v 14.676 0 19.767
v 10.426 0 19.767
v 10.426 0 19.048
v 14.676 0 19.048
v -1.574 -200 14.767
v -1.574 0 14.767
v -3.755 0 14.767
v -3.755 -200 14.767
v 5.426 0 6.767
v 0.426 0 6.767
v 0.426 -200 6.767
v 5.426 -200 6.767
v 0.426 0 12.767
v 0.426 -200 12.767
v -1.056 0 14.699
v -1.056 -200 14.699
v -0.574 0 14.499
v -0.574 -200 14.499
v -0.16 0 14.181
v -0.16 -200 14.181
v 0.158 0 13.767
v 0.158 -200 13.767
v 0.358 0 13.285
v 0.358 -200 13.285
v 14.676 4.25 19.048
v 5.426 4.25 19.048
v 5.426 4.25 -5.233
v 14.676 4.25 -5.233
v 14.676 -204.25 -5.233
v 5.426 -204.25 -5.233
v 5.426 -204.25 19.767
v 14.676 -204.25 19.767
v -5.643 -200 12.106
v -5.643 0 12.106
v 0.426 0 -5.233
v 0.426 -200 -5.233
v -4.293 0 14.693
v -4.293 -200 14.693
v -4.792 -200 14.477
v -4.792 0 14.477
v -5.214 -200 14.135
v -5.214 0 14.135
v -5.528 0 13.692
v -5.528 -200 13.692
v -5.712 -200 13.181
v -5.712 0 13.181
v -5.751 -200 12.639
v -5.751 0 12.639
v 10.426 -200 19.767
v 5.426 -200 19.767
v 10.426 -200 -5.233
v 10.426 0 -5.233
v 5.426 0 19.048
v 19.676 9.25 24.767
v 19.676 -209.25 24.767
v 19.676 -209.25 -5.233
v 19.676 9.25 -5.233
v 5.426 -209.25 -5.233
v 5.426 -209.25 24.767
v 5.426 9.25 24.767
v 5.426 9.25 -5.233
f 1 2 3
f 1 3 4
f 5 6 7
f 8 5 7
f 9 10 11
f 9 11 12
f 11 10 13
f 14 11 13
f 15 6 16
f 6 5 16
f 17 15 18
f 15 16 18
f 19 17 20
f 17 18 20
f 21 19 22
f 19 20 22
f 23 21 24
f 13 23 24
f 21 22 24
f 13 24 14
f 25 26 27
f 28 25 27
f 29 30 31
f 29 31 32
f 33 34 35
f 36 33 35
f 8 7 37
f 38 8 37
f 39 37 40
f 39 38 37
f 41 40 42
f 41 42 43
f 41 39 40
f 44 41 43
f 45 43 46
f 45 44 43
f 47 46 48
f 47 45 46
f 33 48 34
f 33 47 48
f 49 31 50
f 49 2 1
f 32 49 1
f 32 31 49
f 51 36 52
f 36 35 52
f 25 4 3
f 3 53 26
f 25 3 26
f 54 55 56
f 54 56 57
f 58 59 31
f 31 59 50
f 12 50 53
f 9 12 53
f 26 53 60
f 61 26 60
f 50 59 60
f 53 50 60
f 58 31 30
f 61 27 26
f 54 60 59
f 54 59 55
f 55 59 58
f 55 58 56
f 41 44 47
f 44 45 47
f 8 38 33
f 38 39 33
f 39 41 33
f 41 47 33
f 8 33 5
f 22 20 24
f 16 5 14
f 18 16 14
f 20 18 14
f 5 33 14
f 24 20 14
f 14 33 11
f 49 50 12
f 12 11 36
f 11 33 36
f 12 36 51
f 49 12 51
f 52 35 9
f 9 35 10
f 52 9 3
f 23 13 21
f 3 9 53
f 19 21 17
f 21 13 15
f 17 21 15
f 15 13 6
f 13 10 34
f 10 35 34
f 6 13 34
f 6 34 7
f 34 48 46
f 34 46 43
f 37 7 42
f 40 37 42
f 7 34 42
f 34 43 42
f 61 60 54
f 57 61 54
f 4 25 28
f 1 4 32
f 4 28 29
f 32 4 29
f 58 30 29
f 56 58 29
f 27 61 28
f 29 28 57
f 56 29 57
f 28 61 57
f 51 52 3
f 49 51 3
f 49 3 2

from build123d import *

# Parameters (mm, degrees)
F0_W      = 5
F0_H      = 12
F1_DEPTH  = 200
F2_R      = 2
F3_W      = 14.25
F3_H      = 9.25
F4_DEPTH  = 30
F6_DEPTH  = 9.25
F7_W      = 14.25
F7_H      = 9.25
F8_DEPTH  = 30
F9_W      = 9.25
F9_H      = 4.25
F10_DEPTH = 25


with BuildPart() as f1:
    # F0 (on Front) → F1 (new body)
    with BuildSketch(Plane.XZ):
        Polygon((0.426156, 14.766954), (-6.573844, 14.766954), (0.426156, -5.233046), (0.426156, 6.766954), align=None)
        with Locations((2.926156, 0.766954)):
            Rectangle(F0_W, F0_H)
        Polygon((5.426156, 6.766954), (5.426156, -5.233046), (10.426156, -5.233046), (10.426156, 19.766954), (14.676156, 19.766954), (14.676156, -5.233046), (19.676156, -5.233046), (19.676156, 24.766954), (5.426156, 24.766954), align=None)
    extrude(amount=F1_DEPTH)

    # F2
    f2_edges = [f1.edges().sort_by_distance(p)[0] for p in [
        (-6.573844, -100, 14.766954),
        (0.426156, -100, 14.766954),
    ]]
    fillet(f2_edges, radius=F2_R)

    # F3 (on face) → F4 (join)
    with BuildSketch(Plane.XY.offset(24.766954)):
        with Locations((12.551156, 4.625)):
            Rectangle(F3_W, F3_H)
    extrude(amount=-F4_DEPTH)

    # F5 (on face) → F6 (cut)
    with BuildSketch(Plane(origin=(5.426156, 0, 0), x_dir=(0, -1, 0), z_dir=(-1, 0, 0))):
        Polygon((-4.25, -5.233046), (0, -5.233046), (0, 6.766954), (0, 19.047581), (-4.25, 19.047581), align=None)
    extrude(amount=-F6_DEPTH, mode=Mode.SUBTRACT)

    # F7 (on face) → F8 (join)
    with BuildSketch(Plane.XY.offset(24.766954)):
        with Locations((12.551156, -204.625)):
            Rectangle(F7_W, F7_H)
    extrude(amount=-F8_DEPTH)

    # F9 (on face) → F10 (cut)
    with BuildSketch(Plane(origin=(0, 0, -5.233046), x_dir=(1, 0, 0), z_dir=(0, 0, -1))):
        with Locations((10.051156, 202.125)):
            Rectangle(F9_W, F9_H)
    extrude(amount=-F10_DEPTH, mode=Mode.SUBTRACT)


solid = f1.part
